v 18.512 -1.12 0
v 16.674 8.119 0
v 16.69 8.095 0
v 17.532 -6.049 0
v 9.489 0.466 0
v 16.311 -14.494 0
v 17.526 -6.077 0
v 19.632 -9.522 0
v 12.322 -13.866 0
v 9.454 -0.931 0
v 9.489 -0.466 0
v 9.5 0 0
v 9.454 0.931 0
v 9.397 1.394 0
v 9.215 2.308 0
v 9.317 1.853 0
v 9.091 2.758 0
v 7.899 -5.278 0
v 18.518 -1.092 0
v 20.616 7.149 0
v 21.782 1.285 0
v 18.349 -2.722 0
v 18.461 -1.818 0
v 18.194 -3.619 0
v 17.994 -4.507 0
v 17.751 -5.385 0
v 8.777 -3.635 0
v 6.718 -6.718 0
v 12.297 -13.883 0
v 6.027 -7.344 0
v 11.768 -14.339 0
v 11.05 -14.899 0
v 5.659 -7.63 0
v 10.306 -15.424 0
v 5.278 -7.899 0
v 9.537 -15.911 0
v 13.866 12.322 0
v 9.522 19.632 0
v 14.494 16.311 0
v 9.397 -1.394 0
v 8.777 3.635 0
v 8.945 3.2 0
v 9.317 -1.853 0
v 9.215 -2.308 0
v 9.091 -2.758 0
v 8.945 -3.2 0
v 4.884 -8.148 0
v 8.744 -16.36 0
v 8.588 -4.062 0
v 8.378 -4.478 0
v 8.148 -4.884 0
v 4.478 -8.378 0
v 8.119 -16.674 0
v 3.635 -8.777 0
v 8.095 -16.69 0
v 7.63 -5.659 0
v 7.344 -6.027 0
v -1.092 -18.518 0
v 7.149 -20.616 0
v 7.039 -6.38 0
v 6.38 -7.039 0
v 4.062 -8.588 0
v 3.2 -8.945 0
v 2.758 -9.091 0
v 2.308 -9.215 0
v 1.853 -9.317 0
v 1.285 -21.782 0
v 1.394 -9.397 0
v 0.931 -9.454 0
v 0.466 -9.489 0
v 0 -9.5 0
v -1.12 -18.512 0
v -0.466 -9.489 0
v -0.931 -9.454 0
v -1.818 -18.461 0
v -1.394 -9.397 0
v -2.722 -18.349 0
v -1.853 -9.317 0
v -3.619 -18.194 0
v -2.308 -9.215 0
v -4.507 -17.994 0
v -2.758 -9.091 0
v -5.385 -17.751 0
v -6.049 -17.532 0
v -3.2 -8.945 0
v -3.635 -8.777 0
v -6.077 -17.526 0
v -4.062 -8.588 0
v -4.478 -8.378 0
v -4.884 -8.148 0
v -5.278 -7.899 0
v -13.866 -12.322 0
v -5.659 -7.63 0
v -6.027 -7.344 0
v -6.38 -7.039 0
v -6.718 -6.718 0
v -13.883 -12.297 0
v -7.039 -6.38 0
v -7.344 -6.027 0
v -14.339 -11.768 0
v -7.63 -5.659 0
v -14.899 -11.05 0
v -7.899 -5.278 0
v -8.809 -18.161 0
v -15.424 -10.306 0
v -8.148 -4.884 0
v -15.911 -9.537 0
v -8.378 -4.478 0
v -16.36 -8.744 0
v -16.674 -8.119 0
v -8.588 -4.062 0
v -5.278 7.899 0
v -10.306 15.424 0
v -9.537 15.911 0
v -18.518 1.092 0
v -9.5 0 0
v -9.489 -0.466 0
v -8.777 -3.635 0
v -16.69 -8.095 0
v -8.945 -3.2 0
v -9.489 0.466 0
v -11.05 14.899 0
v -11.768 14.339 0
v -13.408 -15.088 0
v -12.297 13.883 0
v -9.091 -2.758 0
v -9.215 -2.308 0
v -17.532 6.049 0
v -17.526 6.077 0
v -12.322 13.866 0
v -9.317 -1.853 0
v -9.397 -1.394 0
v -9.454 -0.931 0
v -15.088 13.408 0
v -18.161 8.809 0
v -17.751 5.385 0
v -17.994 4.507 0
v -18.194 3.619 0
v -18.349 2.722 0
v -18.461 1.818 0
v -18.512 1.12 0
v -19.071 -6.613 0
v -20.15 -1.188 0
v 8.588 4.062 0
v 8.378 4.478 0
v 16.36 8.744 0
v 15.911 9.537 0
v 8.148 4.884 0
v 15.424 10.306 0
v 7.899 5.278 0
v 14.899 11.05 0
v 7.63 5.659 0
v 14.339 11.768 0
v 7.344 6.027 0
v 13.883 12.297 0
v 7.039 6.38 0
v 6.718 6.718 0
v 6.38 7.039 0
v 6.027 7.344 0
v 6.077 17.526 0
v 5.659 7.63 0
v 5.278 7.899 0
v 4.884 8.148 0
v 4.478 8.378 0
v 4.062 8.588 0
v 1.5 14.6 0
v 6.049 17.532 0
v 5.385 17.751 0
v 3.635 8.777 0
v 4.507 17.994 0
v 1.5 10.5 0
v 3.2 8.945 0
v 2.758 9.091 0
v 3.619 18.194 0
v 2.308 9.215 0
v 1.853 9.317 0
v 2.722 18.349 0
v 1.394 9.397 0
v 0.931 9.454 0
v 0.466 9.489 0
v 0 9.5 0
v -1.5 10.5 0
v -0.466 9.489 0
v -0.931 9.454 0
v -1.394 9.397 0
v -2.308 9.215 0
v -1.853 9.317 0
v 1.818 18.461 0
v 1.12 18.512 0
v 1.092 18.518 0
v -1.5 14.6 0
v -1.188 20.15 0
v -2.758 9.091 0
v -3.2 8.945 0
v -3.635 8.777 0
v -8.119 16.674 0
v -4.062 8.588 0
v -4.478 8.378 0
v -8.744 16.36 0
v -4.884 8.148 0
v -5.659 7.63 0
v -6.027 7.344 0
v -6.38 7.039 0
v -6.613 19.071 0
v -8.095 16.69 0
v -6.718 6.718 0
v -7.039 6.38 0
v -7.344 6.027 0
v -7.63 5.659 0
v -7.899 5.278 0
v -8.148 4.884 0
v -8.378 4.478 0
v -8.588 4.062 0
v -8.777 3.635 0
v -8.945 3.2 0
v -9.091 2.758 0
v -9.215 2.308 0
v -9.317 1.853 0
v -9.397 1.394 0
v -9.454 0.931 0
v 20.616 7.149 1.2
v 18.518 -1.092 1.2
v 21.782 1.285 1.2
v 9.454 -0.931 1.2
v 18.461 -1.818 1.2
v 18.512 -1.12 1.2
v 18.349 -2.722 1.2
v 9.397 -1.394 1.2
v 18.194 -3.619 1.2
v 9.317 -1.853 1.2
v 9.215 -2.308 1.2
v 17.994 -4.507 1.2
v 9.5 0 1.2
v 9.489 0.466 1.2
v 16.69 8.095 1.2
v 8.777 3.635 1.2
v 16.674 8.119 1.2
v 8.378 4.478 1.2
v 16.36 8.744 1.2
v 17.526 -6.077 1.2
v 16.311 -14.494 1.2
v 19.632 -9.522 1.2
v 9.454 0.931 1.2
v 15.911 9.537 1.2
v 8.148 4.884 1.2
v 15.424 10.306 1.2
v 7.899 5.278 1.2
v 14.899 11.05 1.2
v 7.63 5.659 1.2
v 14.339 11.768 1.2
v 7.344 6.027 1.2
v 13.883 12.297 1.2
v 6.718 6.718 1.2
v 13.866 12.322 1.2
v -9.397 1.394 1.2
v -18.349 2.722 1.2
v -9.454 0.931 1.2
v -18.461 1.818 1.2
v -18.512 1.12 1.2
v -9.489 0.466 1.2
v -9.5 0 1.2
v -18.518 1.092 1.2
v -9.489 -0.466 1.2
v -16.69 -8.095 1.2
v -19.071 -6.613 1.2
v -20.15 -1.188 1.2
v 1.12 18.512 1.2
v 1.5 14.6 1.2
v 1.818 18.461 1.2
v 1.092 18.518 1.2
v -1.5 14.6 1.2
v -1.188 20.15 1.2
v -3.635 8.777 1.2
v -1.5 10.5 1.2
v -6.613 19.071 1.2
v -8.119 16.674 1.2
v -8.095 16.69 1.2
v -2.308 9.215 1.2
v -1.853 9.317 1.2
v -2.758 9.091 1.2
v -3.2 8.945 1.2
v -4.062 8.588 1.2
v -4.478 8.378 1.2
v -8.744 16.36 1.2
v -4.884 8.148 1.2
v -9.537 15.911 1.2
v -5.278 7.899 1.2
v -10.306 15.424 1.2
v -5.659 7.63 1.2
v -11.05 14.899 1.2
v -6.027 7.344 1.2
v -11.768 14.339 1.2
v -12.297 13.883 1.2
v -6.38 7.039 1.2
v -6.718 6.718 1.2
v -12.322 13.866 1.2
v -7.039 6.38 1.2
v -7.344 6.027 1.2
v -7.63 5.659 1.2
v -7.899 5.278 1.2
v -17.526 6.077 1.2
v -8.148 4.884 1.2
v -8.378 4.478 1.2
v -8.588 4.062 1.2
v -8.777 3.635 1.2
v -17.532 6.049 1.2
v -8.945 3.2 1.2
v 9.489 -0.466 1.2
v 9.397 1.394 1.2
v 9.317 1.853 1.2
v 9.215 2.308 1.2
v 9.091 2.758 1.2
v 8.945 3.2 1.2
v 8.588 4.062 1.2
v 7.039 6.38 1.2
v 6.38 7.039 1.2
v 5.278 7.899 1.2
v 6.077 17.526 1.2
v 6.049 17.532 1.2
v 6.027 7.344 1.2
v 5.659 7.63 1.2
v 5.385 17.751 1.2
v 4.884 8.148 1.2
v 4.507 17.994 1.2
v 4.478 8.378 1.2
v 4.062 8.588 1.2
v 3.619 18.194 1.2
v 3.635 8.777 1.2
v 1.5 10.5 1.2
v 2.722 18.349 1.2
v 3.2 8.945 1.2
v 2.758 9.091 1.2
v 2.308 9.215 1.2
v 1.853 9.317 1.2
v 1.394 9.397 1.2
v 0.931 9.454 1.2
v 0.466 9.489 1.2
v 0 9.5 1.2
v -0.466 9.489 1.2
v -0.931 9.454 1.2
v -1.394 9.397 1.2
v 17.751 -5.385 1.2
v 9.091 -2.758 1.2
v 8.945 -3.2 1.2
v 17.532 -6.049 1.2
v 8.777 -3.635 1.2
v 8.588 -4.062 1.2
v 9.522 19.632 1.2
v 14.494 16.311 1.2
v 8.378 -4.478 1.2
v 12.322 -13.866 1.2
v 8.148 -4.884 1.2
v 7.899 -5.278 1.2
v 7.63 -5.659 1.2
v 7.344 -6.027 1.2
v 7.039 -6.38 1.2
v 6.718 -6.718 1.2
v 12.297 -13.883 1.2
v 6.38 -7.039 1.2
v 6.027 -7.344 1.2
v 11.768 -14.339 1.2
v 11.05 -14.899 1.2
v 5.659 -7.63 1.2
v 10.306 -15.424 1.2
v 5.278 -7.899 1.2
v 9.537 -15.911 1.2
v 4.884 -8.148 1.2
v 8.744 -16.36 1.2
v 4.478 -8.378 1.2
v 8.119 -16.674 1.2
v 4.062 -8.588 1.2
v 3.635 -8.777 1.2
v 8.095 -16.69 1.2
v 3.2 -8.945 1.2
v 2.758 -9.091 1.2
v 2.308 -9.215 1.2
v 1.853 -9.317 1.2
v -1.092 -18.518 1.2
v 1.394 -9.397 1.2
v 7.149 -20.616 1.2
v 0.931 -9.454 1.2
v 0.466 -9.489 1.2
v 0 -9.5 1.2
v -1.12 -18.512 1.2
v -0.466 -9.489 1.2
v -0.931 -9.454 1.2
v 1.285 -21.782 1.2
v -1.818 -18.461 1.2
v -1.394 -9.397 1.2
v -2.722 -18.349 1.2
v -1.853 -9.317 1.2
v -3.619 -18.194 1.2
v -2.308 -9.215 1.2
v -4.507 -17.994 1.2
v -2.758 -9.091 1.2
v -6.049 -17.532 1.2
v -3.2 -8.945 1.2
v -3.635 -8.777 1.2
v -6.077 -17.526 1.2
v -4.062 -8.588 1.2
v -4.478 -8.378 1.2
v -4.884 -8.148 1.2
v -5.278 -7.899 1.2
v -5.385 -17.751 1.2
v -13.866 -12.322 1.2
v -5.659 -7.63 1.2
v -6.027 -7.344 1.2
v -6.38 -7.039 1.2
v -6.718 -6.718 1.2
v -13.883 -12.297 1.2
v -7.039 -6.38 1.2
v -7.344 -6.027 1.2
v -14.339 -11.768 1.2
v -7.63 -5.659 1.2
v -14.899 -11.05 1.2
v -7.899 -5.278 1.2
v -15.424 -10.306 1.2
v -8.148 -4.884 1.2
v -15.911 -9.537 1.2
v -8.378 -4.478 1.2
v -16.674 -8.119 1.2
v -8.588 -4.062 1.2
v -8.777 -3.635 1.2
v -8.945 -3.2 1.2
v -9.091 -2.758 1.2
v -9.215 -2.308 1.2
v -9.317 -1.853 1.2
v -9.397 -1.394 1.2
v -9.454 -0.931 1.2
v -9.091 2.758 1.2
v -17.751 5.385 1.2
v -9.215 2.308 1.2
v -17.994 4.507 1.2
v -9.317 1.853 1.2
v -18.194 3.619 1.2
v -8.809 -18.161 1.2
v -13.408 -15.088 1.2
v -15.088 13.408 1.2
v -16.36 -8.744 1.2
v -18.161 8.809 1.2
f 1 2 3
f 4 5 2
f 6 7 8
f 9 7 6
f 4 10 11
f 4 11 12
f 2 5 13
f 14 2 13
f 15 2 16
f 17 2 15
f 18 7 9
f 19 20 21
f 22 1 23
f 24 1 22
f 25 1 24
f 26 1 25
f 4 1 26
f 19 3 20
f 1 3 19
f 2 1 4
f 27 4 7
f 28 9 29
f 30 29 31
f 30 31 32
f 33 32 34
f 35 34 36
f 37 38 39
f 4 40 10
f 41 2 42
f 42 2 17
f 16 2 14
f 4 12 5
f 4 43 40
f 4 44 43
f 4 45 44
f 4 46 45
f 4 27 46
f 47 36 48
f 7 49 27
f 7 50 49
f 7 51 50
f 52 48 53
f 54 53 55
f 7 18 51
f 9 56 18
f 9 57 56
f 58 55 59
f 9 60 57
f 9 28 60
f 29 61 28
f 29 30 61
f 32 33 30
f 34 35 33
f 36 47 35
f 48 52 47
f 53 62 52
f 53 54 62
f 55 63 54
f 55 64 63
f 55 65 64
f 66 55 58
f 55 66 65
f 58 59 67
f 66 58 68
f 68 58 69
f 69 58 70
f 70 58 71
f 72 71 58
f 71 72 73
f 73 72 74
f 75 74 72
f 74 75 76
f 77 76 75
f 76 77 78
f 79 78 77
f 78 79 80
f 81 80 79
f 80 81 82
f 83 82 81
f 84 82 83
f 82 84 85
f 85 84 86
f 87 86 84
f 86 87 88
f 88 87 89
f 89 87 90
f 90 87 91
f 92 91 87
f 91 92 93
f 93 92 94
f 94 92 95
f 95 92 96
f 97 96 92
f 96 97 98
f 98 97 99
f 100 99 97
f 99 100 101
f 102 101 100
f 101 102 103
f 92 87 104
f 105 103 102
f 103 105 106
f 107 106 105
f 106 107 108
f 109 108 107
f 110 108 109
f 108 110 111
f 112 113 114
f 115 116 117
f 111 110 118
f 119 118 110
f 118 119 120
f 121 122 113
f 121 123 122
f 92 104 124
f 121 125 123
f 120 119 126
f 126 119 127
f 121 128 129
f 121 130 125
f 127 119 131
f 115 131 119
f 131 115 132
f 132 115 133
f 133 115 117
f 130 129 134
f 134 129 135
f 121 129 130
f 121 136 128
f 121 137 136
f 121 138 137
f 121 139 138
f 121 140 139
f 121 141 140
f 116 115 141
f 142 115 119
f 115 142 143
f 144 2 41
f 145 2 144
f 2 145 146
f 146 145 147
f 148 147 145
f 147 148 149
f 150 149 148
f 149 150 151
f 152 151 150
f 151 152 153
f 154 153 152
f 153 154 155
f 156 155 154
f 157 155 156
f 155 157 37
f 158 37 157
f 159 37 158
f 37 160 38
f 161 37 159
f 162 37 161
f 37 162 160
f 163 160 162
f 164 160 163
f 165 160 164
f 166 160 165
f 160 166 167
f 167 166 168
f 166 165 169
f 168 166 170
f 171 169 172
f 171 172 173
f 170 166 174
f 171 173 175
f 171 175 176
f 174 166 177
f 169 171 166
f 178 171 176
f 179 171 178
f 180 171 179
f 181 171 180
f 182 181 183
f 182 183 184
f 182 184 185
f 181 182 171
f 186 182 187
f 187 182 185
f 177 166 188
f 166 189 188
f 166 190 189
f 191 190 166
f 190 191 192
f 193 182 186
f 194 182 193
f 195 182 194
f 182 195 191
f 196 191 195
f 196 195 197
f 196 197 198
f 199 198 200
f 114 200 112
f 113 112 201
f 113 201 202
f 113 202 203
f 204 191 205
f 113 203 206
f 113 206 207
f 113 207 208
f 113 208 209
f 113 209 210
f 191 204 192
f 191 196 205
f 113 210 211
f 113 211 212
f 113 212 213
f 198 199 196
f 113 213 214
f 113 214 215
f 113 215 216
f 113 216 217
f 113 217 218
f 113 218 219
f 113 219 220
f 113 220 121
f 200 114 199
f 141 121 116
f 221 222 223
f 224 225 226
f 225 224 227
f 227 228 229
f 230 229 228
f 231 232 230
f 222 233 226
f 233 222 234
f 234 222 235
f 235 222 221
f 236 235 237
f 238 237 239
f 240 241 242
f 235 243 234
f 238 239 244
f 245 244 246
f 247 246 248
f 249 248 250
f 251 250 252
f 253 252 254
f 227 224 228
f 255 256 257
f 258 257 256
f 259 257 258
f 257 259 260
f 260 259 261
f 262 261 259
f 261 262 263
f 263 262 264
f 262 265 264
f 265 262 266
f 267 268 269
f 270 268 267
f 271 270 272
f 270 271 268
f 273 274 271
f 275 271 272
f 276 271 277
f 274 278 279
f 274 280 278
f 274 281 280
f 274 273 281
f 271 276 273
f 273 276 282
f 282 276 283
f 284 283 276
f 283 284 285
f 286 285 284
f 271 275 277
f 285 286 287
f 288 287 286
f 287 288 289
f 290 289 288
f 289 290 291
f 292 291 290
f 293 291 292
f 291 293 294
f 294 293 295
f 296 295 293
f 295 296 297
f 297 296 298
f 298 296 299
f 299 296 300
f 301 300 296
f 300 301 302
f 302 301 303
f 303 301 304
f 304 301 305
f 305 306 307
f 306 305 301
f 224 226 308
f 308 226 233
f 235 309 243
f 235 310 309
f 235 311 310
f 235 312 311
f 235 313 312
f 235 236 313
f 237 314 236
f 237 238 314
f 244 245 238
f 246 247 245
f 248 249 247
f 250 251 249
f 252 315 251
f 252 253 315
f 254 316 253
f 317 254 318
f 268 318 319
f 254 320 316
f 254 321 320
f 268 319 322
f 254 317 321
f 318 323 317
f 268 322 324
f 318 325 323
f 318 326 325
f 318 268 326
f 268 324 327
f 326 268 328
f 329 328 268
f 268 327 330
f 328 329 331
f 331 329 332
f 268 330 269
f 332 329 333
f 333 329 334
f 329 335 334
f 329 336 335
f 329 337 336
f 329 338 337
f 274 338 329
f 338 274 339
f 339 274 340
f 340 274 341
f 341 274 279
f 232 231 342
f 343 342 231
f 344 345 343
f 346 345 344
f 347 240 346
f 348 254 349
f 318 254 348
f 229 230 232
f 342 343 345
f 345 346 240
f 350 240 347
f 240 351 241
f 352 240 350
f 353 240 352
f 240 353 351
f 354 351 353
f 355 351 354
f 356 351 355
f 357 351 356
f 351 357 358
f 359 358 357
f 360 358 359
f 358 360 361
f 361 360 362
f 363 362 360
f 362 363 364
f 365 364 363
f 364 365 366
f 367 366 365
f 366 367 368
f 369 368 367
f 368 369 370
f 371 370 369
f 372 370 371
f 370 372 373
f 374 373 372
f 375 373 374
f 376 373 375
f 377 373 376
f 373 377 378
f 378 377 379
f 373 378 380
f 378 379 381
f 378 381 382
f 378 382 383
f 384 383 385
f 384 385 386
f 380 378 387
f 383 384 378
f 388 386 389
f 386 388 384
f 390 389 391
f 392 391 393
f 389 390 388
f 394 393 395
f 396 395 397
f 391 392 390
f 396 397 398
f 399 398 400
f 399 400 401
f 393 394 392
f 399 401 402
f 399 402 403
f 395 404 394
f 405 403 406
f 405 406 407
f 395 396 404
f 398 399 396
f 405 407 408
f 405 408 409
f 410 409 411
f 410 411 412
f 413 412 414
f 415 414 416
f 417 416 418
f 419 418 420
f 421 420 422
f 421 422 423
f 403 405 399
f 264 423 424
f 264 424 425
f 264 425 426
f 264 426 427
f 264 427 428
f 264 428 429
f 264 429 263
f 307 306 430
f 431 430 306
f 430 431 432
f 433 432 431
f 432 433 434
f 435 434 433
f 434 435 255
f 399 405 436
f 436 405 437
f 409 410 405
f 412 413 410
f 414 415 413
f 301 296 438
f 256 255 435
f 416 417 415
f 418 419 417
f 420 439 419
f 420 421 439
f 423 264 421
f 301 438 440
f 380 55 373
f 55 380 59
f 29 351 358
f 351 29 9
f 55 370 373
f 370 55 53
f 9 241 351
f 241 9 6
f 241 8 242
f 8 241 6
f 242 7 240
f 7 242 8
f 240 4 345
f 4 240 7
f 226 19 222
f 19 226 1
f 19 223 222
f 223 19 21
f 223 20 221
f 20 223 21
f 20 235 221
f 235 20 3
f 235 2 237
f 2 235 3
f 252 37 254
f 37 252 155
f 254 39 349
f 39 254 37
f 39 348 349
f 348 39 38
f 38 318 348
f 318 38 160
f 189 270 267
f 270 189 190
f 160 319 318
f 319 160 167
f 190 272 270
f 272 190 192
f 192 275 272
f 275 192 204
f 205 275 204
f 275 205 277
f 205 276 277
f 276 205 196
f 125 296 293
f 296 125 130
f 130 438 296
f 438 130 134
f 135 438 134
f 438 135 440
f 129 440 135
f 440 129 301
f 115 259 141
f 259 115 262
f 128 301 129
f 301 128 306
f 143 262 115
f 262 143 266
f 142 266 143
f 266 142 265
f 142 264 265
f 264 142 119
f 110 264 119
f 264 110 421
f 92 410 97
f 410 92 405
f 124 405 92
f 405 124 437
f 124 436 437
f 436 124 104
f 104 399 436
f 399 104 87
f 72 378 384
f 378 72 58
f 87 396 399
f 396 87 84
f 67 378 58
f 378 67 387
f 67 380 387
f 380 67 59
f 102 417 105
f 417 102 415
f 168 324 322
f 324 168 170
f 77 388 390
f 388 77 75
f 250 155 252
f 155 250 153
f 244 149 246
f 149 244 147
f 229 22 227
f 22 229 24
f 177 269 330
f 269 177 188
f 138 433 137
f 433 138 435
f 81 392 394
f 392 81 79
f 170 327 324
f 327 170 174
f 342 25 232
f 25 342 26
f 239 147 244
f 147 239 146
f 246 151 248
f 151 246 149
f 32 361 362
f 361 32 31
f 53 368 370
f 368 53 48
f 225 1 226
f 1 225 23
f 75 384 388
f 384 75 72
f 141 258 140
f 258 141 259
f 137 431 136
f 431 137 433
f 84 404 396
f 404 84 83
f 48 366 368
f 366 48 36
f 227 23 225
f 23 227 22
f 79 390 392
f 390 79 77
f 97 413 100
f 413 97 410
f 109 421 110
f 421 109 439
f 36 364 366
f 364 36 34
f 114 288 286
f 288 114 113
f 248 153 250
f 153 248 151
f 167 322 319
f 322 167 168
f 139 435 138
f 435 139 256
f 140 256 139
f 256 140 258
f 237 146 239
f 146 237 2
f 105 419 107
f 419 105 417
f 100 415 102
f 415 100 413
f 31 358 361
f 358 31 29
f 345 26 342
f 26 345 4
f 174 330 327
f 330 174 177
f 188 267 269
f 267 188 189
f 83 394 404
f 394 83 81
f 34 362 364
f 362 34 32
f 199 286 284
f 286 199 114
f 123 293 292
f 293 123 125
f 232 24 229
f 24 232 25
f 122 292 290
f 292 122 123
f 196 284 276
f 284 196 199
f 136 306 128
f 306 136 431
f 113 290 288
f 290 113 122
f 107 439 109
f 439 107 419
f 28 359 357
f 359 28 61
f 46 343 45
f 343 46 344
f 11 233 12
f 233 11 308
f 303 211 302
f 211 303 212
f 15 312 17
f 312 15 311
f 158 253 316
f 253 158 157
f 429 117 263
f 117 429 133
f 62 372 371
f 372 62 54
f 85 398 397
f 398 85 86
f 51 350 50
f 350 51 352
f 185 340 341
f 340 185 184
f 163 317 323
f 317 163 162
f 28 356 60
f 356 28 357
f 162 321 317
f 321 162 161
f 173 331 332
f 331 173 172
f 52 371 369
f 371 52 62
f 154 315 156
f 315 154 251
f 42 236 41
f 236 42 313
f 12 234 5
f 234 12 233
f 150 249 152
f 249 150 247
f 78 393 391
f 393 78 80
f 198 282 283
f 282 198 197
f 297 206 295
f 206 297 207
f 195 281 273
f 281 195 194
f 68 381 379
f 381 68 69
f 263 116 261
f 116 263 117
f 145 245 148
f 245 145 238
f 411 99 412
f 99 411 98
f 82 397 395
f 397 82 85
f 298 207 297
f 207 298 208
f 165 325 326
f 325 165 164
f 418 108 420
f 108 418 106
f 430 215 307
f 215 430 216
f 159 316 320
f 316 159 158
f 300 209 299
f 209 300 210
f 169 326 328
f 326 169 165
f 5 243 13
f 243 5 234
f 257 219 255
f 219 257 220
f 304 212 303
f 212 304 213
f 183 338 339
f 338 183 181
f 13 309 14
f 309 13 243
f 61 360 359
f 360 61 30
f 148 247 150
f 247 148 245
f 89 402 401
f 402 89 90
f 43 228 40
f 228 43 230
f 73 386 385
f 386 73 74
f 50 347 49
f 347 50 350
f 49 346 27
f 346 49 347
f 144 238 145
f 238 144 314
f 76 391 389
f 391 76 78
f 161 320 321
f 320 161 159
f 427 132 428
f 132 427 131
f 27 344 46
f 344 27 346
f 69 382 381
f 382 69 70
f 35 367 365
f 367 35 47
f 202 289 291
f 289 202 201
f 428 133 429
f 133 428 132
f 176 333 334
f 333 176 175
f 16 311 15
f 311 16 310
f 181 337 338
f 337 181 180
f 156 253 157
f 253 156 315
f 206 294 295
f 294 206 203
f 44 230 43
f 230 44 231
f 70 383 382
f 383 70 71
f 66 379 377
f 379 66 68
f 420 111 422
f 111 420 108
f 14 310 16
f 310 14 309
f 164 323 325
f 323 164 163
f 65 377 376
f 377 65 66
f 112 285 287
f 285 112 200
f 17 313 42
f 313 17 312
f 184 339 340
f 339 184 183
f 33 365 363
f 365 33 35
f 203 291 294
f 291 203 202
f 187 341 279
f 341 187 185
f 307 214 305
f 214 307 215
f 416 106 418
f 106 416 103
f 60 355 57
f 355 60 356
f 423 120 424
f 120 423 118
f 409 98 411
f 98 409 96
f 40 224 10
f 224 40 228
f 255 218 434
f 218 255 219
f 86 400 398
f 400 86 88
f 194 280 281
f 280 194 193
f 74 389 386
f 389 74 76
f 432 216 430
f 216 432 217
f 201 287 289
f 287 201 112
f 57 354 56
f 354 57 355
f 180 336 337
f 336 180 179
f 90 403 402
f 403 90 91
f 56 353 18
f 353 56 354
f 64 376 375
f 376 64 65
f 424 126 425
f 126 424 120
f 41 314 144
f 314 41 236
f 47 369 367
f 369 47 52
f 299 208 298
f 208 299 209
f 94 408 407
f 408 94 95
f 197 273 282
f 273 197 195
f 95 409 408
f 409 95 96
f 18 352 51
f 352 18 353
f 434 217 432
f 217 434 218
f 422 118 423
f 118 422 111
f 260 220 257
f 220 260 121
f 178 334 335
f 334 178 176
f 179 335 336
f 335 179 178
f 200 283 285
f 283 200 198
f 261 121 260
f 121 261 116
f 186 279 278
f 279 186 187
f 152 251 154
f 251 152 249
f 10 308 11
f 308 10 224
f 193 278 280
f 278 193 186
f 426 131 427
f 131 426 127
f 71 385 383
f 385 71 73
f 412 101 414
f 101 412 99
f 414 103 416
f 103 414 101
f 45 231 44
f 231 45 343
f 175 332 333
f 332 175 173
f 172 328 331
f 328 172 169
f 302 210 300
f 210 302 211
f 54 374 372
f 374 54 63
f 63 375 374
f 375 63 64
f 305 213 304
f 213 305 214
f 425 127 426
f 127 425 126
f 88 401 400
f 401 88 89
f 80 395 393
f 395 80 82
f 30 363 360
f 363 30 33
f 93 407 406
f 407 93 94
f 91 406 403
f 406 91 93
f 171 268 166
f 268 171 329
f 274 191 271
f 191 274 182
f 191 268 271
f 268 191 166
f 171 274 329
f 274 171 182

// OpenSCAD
/*
  Elna Supermatic cam 33
  Name: Source profile 33
  Status: source-profile

  Generated from measured parametric base v2.
  Surface mode: stepped
*/

include <_elna_measured_common.scad>;

profile_points = [
        [1.0921, 18.5178],
        [6.0775, 17.5262],
        [9.5224, 19.6325],
        [14.4940, 16.3106],
        [13.8663, 12.3219],
        [16.6903, 8.0954],
        [20.6157, 7.1489],
        [21.7822, 1.2846],
        [18.5178, -1.0921],
        [17.5262, -6.0775],
        [19.6325, -9.5224],
        [16.3106, -14.4940],
        [12.3219, -13.8663],
        [8.0954, -16.6903],
        [7.1489, -20.6157],
        [1.2846, -21.7822],
        [-1.0921, -18.5178],
        [-6.0775, -17.5262],
        [-8.8089, -18.1614],
        [-13.4079, -15.0885],
        [-13.8663, -12.3219],
        [-16.6903, -8.0954],
        [-19.0709, -6.6132],
        [-20.1500, -1.1883],
        [-18.5178, 1.0921],
        [-17.5262, 6.0775],
        [-18.1614, 8.8089],
        [-15.0885, 13.4079],
        [-12.3219, 13.8663],
        [-8.0954, 16.6903],
        [-6.6132, 19.0709],
        [-1.1883, 20.1500]
];

icon_points = [[-1.000,0.180], [-0.780,0.840], [-0.560,0.180], [-0.340,0.640], [-0.120,0.180], [0.100,0.560], [0.320,0.180], [0.540,0.460], [0.760,0.180], [1.000,0.380]];

elna_cam_ring(profile_points=profile_points);
